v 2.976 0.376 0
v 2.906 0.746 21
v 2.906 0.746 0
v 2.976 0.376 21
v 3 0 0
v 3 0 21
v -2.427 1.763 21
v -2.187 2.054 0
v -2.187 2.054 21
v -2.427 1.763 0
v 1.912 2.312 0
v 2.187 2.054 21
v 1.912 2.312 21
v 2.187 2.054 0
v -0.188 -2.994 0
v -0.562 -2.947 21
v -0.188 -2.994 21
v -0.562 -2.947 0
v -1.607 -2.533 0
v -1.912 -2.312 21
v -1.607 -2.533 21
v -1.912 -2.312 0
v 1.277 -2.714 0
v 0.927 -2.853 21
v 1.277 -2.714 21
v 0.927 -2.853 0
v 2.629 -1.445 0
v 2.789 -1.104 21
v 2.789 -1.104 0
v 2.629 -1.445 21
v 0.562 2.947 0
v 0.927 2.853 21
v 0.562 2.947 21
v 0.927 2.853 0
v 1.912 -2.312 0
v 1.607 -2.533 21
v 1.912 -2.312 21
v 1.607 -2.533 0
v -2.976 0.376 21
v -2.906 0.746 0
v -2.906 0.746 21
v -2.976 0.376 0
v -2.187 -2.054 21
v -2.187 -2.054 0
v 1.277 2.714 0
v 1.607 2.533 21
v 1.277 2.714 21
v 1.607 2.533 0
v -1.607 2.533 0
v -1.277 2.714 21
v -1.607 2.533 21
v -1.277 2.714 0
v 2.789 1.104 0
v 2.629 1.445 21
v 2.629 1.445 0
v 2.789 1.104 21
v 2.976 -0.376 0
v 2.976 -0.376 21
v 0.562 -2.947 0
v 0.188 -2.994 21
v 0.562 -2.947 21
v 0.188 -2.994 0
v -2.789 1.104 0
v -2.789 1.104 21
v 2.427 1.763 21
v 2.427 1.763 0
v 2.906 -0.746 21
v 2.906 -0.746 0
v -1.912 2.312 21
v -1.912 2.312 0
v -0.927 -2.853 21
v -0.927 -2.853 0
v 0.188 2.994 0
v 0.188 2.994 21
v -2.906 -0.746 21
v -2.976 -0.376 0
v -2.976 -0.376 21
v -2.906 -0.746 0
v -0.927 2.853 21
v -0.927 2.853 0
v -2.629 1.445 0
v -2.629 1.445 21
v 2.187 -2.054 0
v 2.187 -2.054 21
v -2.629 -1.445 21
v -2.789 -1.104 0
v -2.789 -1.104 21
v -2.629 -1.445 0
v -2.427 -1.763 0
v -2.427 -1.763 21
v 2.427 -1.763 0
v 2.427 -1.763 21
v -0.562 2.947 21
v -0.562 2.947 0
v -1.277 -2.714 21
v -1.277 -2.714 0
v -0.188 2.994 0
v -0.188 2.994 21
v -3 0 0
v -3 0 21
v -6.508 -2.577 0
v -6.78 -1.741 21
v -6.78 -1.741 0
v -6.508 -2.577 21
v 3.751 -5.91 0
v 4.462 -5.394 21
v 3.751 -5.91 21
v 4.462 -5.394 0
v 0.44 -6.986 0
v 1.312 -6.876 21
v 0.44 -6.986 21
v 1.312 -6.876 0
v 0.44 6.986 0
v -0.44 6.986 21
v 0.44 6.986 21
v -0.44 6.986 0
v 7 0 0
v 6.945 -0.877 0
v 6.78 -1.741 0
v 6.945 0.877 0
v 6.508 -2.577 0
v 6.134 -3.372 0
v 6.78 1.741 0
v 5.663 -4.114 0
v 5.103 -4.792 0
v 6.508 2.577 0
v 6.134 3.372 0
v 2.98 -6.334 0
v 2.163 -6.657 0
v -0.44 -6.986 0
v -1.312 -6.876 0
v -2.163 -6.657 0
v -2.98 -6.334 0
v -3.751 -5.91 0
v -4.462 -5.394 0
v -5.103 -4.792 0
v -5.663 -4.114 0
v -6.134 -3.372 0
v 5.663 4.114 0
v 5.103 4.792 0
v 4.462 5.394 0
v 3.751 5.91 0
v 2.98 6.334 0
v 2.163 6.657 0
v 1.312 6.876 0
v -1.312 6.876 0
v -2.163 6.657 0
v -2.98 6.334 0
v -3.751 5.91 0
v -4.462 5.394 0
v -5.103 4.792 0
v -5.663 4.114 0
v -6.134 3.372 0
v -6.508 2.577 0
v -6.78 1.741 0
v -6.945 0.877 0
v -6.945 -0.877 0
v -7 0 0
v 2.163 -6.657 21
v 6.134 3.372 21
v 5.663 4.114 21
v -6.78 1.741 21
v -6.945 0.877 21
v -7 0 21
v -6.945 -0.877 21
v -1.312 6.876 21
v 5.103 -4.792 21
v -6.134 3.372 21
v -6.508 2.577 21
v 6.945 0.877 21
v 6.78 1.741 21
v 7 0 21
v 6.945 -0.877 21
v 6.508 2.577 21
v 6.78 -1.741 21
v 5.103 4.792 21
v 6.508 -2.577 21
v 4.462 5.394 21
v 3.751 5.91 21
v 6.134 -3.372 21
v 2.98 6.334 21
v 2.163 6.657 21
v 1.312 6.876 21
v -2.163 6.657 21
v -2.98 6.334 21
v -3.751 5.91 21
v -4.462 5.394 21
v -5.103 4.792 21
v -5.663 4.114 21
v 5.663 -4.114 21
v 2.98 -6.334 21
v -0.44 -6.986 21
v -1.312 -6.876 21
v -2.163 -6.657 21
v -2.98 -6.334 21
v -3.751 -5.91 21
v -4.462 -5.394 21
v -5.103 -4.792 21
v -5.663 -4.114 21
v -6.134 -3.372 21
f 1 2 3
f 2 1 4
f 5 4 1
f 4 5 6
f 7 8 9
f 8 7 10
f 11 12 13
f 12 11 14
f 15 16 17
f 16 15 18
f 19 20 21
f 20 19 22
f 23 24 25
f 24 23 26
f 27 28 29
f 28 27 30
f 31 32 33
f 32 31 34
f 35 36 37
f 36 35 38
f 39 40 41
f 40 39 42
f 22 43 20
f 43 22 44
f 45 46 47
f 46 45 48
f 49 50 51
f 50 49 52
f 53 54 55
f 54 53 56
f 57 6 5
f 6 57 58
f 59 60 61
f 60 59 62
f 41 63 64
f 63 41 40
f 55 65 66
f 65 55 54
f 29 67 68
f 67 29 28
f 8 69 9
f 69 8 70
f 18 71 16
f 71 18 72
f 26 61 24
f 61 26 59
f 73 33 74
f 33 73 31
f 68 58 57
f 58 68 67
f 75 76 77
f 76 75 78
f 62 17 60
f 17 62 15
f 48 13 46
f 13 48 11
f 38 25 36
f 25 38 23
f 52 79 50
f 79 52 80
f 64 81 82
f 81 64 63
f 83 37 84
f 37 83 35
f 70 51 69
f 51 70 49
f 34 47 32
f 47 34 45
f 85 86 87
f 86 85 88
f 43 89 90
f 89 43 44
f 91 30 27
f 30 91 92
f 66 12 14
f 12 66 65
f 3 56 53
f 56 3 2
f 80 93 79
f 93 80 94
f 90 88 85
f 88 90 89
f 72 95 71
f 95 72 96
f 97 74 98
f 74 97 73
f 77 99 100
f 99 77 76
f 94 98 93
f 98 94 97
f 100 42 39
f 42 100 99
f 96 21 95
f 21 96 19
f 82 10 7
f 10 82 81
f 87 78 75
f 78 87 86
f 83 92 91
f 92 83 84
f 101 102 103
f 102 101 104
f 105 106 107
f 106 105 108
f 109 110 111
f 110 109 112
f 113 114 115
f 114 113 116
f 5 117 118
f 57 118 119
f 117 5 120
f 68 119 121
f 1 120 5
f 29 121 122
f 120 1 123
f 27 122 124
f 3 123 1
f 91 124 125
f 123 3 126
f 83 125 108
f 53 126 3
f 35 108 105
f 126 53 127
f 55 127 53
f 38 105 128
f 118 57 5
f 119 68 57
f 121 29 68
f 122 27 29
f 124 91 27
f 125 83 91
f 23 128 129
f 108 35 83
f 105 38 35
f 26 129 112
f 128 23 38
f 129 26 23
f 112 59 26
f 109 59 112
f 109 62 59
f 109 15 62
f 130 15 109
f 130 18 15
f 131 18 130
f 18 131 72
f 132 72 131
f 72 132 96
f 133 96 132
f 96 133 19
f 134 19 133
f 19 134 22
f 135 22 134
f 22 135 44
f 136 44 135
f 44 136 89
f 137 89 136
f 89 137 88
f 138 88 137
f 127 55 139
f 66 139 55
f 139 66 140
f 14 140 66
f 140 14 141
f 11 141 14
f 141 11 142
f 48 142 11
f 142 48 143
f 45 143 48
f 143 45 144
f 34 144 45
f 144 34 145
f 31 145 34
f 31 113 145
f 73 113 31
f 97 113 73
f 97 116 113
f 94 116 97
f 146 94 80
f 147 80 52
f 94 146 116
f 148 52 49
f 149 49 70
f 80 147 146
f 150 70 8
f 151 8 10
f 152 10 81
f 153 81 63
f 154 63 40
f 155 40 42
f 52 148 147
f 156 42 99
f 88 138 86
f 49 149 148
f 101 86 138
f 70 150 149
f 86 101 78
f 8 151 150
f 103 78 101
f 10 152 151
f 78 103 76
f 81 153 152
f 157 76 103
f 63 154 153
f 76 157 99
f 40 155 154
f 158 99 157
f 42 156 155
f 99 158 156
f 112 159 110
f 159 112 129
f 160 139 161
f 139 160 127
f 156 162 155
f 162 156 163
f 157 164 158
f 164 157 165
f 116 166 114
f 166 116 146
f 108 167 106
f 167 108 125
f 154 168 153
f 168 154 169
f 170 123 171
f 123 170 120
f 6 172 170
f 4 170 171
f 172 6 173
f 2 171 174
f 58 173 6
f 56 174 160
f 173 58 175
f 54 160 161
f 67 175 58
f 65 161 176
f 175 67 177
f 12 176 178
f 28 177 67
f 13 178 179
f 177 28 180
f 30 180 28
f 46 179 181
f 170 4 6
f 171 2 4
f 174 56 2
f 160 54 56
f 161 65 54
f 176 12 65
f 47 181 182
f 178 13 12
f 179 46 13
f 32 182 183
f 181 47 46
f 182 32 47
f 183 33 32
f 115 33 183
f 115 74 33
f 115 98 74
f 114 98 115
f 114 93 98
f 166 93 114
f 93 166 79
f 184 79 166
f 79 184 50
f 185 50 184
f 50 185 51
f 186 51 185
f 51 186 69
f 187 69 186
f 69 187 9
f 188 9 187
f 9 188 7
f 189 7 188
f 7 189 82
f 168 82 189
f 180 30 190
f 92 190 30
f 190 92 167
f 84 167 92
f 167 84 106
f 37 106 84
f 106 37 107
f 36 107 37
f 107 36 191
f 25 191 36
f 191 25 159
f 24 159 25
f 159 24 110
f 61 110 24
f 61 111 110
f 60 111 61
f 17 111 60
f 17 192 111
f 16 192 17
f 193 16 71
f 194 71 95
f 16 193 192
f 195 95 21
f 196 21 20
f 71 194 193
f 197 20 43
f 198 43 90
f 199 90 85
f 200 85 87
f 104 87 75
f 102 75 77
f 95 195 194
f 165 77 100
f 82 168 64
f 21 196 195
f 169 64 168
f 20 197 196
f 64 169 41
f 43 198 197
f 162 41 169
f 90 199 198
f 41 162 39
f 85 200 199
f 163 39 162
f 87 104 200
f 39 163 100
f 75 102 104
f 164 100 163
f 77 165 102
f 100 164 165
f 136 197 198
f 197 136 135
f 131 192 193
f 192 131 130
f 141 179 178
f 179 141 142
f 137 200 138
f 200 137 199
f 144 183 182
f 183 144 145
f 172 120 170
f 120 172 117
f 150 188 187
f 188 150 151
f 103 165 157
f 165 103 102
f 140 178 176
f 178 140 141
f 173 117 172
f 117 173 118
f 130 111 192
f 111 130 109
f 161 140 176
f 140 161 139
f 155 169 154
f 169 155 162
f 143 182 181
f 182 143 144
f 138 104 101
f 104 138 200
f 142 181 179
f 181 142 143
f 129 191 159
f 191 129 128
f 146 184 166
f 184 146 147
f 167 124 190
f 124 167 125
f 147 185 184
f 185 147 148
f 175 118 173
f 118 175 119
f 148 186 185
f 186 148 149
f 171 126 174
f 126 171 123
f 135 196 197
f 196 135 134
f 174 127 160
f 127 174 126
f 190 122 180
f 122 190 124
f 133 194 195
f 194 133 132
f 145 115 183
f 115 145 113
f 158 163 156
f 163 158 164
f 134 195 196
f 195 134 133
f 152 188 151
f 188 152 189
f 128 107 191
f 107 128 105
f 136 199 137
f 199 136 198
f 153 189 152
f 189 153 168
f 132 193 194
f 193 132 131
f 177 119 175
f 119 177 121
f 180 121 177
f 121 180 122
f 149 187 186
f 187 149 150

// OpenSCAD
$fn = 50;


difference() {
	union() {
		*color(alpha = 1.0000000000, c = "gray") {
			translate(v = [0, 7, 0]) {
				linear_extrude(height = 1) {
					text(font = "Arial:style=Bold", halign = "center", size = 4.5000000000, text = "COMMENT plate main", valign = "center");
				}
			}
		}
		cylinder(h = 21, r = 7.0000000000);
	}
	union() {
		*color(alpha = 1.0000000000, c = "gray") {
			translate(v = [0, 7, 0]) {
				linear_extrude(height = 1) {
					text(font = "Arial:style=Bold", halign = "center", size = 4.5000000000, text = "COMMENT holes main", valign = "center");
				}
			}
		}
		translate(v = [0, 0, -100]) {
			cylinder(h = 200, r = 3.0000000000);
		}
		translate(v = [0, 0, -100]) {
			cylinder(h = 200, r = 1.5000000000);
		}
	}
}
